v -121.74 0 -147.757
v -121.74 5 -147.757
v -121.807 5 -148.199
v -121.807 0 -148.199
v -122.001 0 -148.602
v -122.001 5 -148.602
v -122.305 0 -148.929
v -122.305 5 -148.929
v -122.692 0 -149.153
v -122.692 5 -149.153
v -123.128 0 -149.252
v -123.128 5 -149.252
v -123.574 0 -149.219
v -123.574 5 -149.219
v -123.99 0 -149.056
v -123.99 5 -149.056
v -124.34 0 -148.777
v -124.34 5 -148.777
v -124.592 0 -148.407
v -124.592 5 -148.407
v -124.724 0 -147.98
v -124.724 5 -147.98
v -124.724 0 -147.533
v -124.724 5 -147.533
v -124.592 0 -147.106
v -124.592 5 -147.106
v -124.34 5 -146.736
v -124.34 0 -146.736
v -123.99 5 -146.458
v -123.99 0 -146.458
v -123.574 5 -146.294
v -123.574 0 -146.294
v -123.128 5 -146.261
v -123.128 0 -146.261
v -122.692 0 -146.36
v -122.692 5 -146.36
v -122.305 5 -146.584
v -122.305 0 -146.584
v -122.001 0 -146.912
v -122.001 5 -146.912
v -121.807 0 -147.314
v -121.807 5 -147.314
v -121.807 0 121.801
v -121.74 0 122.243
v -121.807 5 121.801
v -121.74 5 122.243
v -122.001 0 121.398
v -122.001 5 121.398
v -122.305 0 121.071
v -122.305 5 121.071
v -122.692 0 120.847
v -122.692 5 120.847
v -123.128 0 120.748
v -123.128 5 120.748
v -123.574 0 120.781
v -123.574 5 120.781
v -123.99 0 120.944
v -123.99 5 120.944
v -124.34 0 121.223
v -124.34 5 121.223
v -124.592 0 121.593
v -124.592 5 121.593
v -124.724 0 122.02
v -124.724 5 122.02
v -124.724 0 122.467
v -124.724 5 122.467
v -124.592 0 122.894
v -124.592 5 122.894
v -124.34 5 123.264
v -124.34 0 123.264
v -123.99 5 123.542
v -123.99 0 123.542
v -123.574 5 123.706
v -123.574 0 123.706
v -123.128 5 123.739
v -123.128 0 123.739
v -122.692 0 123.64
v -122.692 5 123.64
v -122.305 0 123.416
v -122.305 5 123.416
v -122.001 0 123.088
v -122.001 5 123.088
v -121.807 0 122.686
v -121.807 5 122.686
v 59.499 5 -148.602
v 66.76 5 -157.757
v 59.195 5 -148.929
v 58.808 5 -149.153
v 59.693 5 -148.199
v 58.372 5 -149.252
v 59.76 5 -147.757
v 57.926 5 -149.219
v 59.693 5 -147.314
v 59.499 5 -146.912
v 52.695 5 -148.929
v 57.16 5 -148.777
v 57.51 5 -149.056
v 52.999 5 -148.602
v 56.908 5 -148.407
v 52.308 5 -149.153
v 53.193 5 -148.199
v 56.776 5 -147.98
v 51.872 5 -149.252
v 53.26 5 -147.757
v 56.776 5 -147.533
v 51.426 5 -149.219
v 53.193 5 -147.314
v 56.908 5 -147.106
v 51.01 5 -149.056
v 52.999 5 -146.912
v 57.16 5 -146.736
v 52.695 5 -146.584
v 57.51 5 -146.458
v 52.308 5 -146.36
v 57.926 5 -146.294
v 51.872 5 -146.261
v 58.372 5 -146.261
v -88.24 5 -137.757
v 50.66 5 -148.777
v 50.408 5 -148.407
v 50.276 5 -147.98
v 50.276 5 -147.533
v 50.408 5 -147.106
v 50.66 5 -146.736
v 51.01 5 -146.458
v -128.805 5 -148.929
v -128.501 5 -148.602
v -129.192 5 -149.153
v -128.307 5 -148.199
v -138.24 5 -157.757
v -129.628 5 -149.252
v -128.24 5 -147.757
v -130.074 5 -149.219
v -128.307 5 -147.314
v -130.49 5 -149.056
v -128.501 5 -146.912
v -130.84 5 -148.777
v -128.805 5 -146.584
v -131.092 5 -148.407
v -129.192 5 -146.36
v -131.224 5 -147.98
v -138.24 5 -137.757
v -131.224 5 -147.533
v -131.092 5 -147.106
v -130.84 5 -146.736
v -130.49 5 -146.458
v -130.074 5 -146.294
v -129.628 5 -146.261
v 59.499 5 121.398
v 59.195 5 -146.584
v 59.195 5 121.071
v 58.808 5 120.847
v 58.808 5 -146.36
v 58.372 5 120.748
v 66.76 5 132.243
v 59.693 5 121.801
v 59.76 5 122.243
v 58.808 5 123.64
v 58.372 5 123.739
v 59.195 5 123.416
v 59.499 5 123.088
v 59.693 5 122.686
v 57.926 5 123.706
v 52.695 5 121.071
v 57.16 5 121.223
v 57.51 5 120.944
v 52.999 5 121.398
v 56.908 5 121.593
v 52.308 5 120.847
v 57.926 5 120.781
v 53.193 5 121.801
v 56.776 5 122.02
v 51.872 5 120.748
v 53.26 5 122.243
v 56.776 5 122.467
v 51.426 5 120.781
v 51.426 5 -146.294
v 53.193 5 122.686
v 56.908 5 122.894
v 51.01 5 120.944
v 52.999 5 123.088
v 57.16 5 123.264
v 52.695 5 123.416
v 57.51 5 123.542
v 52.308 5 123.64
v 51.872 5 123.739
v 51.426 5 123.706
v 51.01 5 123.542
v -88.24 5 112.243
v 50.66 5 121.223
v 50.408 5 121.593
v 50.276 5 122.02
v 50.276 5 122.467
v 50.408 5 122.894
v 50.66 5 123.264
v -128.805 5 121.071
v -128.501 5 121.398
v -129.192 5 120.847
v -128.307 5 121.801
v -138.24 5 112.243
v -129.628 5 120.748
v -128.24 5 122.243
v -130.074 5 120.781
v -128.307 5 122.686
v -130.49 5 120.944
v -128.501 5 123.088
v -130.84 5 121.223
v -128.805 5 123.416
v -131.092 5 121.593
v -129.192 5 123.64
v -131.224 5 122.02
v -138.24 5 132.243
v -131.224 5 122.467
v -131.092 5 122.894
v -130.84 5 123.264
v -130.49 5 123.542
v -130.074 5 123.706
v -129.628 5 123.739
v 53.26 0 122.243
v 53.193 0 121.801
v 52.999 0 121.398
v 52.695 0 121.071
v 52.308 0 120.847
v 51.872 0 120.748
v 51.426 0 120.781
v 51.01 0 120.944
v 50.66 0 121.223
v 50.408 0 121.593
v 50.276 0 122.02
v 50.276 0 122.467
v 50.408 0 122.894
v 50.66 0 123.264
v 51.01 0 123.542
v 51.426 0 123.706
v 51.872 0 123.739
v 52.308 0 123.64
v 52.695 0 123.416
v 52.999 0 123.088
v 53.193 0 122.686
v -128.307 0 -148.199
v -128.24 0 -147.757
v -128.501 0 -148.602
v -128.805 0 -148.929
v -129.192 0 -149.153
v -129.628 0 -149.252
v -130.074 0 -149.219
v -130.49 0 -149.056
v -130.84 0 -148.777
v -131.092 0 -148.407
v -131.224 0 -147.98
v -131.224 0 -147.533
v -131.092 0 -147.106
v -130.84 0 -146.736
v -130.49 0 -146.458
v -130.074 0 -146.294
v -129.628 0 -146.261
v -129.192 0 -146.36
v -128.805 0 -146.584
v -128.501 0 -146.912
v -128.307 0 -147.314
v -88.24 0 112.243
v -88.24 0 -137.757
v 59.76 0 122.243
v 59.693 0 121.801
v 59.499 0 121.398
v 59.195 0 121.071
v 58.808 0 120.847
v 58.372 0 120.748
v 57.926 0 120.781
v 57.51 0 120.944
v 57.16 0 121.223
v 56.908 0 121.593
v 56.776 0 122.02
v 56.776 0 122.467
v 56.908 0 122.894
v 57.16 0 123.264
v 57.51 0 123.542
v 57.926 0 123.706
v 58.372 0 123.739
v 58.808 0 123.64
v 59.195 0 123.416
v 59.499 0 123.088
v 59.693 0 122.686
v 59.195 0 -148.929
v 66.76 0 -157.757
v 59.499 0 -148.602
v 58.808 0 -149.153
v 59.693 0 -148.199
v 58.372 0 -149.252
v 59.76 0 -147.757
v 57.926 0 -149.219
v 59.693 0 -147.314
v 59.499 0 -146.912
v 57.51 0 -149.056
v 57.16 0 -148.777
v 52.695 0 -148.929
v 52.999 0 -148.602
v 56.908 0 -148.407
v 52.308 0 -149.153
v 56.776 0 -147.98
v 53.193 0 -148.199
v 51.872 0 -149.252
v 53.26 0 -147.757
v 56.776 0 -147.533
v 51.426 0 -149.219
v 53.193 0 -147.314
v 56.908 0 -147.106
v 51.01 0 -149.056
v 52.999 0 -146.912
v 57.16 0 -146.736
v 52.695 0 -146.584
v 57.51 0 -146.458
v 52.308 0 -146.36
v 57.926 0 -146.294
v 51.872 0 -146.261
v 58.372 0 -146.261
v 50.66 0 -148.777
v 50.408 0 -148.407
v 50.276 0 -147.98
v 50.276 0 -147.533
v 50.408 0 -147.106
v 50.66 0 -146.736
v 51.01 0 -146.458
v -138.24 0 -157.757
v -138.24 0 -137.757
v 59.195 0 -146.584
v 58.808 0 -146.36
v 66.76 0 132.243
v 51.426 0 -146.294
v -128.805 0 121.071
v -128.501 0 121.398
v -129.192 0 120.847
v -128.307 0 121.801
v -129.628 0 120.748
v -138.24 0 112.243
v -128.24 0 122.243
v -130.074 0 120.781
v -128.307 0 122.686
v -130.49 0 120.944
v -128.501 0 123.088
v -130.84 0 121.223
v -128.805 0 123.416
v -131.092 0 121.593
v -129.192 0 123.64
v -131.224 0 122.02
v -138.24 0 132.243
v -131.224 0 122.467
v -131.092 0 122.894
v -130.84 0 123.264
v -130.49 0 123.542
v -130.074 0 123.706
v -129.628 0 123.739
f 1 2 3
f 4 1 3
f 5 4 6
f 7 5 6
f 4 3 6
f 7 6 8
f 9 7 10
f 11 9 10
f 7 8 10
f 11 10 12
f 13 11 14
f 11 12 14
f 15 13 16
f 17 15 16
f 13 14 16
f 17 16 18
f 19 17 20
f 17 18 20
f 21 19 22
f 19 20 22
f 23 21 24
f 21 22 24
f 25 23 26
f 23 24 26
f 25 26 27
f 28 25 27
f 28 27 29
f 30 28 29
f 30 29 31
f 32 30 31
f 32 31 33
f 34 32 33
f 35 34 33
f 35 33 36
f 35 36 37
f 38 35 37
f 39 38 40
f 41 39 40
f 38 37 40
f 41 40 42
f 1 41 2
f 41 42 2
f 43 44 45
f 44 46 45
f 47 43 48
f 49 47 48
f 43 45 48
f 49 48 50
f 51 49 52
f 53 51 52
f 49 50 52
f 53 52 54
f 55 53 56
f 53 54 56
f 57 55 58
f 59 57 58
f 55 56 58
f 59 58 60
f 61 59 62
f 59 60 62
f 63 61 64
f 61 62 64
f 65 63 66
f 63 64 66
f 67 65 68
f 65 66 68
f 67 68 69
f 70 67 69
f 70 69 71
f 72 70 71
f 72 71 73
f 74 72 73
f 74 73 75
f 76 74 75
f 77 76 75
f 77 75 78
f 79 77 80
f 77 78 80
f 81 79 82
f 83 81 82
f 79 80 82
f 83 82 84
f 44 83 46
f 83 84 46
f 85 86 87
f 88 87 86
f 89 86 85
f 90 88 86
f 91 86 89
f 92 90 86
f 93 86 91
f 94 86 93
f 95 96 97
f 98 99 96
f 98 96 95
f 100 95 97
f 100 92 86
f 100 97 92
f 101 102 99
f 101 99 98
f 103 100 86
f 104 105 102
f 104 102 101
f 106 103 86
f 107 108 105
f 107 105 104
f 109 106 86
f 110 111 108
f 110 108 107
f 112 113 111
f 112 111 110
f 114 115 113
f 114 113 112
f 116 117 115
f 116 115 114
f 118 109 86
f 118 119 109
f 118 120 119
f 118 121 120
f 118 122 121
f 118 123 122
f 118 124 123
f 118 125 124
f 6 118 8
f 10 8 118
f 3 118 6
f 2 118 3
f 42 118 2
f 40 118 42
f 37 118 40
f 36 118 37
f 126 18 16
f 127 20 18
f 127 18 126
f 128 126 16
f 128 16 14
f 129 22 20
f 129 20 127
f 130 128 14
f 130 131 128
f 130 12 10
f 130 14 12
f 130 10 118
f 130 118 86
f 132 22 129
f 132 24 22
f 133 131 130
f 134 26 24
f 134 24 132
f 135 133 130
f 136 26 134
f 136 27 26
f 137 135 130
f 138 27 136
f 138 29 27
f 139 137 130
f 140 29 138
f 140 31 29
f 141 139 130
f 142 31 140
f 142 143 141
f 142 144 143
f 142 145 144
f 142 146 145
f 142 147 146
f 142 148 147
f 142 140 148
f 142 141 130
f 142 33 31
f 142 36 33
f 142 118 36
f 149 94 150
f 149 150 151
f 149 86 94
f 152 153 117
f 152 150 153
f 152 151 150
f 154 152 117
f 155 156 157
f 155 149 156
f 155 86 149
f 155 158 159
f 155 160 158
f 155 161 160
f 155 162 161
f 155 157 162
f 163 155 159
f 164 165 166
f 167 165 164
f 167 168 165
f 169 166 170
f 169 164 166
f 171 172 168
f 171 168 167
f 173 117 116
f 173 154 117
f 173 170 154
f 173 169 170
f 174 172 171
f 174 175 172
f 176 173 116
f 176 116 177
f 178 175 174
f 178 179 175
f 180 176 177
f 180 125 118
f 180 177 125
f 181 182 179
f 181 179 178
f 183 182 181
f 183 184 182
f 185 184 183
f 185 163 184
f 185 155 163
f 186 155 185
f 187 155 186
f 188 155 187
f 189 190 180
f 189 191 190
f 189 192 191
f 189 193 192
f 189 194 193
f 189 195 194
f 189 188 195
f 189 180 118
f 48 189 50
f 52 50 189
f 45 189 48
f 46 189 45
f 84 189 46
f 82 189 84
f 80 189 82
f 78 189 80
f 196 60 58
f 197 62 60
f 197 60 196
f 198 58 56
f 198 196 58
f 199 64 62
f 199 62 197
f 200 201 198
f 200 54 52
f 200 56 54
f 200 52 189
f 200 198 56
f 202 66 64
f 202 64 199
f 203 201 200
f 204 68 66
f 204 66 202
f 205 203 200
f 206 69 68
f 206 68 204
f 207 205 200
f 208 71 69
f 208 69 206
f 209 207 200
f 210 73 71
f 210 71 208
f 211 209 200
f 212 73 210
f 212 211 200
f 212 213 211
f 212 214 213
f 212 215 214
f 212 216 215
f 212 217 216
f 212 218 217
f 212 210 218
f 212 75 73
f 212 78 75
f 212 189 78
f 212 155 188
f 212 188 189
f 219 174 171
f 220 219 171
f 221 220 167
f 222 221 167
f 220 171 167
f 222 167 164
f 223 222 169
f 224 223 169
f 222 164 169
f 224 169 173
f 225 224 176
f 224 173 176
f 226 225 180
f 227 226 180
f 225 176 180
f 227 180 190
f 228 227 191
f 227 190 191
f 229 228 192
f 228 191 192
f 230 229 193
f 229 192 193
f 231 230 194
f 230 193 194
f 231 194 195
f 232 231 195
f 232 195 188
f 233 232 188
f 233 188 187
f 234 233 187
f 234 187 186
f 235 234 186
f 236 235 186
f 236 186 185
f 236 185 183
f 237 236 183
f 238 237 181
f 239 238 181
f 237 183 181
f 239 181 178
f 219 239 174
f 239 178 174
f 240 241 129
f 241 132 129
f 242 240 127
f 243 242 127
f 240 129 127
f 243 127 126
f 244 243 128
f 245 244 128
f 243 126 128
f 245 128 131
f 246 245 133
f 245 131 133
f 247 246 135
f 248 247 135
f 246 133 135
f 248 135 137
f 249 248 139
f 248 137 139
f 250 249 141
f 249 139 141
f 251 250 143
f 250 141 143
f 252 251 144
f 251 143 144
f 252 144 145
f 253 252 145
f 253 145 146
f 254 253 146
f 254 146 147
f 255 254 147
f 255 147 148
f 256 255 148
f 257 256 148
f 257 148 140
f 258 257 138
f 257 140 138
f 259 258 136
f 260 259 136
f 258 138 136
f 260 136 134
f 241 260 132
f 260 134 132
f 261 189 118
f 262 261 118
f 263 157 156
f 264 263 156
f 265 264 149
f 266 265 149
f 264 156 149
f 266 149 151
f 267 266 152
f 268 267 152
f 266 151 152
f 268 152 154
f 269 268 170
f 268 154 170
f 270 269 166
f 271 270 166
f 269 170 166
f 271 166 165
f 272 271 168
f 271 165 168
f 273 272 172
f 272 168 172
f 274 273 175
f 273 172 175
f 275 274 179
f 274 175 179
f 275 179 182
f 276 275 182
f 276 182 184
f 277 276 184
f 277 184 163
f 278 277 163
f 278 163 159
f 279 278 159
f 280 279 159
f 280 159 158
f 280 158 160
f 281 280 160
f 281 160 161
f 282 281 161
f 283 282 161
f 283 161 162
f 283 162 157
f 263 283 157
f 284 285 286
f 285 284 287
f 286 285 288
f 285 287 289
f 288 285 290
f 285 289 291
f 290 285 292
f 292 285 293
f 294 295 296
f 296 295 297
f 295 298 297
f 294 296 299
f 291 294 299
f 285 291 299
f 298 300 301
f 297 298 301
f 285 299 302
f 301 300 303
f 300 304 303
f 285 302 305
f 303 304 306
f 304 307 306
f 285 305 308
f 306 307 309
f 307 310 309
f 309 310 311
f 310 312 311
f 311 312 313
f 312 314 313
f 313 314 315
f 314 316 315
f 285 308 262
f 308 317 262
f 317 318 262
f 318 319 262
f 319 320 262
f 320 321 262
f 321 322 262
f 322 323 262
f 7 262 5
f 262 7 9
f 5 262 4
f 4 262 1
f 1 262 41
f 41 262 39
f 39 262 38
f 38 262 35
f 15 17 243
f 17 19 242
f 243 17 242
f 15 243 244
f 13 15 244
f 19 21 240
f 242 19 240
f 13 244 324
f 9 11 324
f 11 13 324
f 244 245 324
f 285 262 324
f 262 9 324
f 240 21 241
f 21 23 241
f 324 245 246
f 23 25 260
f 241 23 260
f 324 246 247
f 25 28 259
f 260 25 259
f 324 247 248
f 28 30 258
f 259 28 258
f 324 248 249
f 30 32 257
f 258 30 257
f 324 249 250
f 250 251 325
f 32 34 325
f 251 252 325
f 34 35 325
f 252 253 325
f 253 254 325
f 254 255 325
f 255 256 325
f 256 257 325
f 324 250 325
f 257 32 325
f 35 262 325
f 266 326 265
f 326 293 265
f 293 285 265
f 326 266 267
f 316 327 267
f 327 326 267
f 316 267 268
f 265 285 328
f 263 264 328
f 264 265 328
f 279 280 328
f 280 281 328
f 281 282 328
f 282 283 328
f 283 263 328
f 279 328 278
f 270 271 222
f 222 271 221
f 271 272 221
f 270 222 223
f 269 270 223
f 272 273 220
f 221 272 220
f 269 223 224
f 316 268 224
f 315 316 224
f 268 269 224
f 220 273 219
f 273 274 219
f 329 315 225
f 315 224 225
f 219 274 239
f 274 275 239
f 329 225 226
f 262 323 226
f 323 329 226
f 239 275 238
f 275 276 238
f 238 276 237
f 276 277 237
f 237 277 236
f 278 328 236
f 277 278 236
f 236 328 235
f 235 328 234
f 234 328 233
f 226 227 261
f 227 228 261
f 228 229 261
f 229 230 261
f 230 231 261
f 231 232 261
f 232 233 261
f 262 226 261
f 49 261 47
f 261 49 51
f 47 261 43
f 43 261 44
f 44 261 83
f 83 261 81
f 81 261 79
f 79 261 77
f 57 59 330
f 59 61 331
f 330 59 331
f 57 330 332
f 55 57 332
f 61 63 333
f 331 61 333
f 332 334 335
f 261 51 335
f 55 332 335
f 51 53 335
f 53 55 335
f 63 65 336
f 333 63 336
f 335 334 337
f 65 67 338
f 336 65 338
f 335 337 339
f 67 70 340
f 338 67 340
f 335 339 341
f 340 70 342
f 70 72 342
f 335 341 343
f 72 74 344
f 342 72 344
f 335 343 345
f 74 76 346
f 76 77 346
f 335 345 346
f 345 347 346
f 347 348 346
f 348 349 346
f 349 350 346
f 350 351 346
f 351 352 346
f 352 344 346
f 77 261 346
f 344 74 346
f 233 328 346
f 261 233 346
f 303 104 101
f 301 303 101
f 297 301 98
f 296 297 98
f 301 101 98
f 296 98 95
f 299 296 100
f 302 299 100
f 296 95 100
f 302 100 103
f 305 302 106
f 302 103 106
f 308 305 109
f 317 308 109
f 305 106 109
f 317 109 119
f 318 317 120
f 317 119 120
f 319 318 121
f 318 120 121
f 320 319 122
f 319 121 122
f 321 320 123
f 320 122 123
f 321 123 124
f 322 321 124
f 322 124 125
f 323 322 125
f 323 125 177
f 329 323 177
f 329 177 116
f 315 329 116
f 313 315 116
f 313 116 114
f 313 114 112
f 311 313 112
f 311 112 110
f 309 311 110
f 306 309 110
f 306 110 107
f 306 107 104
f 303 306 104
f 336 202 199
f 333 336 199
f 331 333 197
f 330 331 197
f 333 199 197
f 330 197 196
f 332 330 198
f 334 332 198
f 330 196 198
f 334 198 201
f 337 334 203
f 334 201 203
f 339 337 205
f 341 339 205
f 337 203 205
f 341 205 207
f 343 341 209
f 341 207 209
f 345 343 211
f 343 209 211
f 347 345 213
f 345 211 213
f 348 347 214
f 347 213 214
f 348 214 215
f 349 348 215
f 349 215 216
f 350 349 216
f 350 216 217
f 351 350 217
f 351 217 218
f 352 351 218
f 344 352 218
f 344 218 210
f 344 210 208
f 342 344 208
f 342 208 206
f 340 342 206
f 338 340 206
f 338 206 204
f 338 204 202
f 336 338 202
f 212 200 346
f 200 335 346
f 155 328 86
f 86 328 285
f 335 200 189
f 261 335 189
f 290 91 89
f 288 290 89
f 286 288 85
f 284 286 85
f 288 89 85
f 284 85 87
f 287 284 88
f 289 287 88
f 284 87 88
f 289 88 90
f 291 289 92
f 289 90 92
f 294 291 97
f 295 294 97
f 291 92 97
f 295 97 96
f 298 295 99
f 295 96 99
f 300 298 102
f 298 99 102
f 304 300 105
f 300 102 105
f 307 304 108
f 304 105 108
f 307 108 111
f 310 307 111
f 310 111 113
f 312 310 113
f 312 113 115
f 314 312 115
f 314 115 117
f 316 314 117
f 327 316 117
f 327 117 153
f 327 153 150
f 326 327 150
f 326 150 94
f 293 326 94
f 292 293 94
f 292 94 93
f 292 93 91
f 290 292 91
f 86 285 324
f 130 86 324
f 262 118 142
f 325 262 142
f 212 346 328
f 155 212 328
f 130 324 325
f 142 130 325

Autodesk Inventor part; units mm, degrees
ref_plane "YZ Plane" through (0, 0, 0) normal (1, 0, 0) x (0, 1, 0)
ref_plane "XZ Plane" through (0, 0, 0) normal (0, 1, 0) x (-1, 0, 0)
ref_plane "XY Plane" through (0, 0, 0) normal (0, 0, 1) x (1, 0, 0)
sketch "Esquisse1" plane through (0, 0, 0) normal (0, 1, 0) x (-1, 0, 0)
  line L0 (138.2405, 132.2434) -> (-66.7595, 132.2434)
  line L1 (-66.7595, 132.2434) -> (-66.7595, -157.7566)
  line L2 (-66.7595, -157.7566) -> (138.2405, -157.7566)
  line L3 (138.2405, -157.7566) -> (138.2405, 132.2434)
  point P0 (0, 0)
  dimension "d0" = 290
  dimension "d1" = 205
extrude "Extrusion1" add sketch "Esquisse1" along normal blind 5
sketch "Esquisse2" plane through (0, 5, 0) normal (0, 1, 0) x (1, 0, 0)
  line L0 (-138.2405, 157.7566) -> (-138.2405, -132.2434) projected
  line L1 (-138.2405, -112.2434) -> (-88.2405, -112.2434)
  line L2 (-88.2405, -112.2434) -> (-88.2405, 137.7566)
  line L3 (-88.2405, 137.7566) -> (-138.2405, 137.7566)
  line L4 (-138.2405, 137.7566) -> (-138.2405, -112.2434)
  line L5 (-138.2405, -132.2434) -> (66.7595, -132.2434) projected
  line L6 (66.7595, 157.7566) -> (-138.2405, 157.7566) projected
  point P0 (0, 0)
  dimension "d4" = 20
  dimension "d5" = 20
  dimension "d6" = 50
extrude "Extrusion2" cut sketch "Esquisse2" against normal up to next
sketch "Esquisse3" plane through (0, 5, 0) normal (0, 1, 0) x (1, 0, 0)
  circle A0 centre (58.2595, 147.7566) radius 1.5 projected
  circle A1 centre (51.7595, 147.7566) radius 1.5 projected
  circle A2 centre (58.2595, -122.2434) radius 1.5 projected
  circle A3 centre (51.7595, -122.2434) radius 1.5 projected
  circle A4 centre (-123.2405, -122.2434) radius 1.5 projected
  circle A5 centre (-129.7405, -122.2434) radius 1.5 projected
  circle A6 centre (-123.2405, 147.7566) radius 1.5 projected
  circle A7 centre (-129.7405, 147.7566) radius 1.5 projected
  point P0 (0, 0)
extrude "Extrusion3" cut sketch "Esquisse3" against normal up to next
properties part number "étage"
